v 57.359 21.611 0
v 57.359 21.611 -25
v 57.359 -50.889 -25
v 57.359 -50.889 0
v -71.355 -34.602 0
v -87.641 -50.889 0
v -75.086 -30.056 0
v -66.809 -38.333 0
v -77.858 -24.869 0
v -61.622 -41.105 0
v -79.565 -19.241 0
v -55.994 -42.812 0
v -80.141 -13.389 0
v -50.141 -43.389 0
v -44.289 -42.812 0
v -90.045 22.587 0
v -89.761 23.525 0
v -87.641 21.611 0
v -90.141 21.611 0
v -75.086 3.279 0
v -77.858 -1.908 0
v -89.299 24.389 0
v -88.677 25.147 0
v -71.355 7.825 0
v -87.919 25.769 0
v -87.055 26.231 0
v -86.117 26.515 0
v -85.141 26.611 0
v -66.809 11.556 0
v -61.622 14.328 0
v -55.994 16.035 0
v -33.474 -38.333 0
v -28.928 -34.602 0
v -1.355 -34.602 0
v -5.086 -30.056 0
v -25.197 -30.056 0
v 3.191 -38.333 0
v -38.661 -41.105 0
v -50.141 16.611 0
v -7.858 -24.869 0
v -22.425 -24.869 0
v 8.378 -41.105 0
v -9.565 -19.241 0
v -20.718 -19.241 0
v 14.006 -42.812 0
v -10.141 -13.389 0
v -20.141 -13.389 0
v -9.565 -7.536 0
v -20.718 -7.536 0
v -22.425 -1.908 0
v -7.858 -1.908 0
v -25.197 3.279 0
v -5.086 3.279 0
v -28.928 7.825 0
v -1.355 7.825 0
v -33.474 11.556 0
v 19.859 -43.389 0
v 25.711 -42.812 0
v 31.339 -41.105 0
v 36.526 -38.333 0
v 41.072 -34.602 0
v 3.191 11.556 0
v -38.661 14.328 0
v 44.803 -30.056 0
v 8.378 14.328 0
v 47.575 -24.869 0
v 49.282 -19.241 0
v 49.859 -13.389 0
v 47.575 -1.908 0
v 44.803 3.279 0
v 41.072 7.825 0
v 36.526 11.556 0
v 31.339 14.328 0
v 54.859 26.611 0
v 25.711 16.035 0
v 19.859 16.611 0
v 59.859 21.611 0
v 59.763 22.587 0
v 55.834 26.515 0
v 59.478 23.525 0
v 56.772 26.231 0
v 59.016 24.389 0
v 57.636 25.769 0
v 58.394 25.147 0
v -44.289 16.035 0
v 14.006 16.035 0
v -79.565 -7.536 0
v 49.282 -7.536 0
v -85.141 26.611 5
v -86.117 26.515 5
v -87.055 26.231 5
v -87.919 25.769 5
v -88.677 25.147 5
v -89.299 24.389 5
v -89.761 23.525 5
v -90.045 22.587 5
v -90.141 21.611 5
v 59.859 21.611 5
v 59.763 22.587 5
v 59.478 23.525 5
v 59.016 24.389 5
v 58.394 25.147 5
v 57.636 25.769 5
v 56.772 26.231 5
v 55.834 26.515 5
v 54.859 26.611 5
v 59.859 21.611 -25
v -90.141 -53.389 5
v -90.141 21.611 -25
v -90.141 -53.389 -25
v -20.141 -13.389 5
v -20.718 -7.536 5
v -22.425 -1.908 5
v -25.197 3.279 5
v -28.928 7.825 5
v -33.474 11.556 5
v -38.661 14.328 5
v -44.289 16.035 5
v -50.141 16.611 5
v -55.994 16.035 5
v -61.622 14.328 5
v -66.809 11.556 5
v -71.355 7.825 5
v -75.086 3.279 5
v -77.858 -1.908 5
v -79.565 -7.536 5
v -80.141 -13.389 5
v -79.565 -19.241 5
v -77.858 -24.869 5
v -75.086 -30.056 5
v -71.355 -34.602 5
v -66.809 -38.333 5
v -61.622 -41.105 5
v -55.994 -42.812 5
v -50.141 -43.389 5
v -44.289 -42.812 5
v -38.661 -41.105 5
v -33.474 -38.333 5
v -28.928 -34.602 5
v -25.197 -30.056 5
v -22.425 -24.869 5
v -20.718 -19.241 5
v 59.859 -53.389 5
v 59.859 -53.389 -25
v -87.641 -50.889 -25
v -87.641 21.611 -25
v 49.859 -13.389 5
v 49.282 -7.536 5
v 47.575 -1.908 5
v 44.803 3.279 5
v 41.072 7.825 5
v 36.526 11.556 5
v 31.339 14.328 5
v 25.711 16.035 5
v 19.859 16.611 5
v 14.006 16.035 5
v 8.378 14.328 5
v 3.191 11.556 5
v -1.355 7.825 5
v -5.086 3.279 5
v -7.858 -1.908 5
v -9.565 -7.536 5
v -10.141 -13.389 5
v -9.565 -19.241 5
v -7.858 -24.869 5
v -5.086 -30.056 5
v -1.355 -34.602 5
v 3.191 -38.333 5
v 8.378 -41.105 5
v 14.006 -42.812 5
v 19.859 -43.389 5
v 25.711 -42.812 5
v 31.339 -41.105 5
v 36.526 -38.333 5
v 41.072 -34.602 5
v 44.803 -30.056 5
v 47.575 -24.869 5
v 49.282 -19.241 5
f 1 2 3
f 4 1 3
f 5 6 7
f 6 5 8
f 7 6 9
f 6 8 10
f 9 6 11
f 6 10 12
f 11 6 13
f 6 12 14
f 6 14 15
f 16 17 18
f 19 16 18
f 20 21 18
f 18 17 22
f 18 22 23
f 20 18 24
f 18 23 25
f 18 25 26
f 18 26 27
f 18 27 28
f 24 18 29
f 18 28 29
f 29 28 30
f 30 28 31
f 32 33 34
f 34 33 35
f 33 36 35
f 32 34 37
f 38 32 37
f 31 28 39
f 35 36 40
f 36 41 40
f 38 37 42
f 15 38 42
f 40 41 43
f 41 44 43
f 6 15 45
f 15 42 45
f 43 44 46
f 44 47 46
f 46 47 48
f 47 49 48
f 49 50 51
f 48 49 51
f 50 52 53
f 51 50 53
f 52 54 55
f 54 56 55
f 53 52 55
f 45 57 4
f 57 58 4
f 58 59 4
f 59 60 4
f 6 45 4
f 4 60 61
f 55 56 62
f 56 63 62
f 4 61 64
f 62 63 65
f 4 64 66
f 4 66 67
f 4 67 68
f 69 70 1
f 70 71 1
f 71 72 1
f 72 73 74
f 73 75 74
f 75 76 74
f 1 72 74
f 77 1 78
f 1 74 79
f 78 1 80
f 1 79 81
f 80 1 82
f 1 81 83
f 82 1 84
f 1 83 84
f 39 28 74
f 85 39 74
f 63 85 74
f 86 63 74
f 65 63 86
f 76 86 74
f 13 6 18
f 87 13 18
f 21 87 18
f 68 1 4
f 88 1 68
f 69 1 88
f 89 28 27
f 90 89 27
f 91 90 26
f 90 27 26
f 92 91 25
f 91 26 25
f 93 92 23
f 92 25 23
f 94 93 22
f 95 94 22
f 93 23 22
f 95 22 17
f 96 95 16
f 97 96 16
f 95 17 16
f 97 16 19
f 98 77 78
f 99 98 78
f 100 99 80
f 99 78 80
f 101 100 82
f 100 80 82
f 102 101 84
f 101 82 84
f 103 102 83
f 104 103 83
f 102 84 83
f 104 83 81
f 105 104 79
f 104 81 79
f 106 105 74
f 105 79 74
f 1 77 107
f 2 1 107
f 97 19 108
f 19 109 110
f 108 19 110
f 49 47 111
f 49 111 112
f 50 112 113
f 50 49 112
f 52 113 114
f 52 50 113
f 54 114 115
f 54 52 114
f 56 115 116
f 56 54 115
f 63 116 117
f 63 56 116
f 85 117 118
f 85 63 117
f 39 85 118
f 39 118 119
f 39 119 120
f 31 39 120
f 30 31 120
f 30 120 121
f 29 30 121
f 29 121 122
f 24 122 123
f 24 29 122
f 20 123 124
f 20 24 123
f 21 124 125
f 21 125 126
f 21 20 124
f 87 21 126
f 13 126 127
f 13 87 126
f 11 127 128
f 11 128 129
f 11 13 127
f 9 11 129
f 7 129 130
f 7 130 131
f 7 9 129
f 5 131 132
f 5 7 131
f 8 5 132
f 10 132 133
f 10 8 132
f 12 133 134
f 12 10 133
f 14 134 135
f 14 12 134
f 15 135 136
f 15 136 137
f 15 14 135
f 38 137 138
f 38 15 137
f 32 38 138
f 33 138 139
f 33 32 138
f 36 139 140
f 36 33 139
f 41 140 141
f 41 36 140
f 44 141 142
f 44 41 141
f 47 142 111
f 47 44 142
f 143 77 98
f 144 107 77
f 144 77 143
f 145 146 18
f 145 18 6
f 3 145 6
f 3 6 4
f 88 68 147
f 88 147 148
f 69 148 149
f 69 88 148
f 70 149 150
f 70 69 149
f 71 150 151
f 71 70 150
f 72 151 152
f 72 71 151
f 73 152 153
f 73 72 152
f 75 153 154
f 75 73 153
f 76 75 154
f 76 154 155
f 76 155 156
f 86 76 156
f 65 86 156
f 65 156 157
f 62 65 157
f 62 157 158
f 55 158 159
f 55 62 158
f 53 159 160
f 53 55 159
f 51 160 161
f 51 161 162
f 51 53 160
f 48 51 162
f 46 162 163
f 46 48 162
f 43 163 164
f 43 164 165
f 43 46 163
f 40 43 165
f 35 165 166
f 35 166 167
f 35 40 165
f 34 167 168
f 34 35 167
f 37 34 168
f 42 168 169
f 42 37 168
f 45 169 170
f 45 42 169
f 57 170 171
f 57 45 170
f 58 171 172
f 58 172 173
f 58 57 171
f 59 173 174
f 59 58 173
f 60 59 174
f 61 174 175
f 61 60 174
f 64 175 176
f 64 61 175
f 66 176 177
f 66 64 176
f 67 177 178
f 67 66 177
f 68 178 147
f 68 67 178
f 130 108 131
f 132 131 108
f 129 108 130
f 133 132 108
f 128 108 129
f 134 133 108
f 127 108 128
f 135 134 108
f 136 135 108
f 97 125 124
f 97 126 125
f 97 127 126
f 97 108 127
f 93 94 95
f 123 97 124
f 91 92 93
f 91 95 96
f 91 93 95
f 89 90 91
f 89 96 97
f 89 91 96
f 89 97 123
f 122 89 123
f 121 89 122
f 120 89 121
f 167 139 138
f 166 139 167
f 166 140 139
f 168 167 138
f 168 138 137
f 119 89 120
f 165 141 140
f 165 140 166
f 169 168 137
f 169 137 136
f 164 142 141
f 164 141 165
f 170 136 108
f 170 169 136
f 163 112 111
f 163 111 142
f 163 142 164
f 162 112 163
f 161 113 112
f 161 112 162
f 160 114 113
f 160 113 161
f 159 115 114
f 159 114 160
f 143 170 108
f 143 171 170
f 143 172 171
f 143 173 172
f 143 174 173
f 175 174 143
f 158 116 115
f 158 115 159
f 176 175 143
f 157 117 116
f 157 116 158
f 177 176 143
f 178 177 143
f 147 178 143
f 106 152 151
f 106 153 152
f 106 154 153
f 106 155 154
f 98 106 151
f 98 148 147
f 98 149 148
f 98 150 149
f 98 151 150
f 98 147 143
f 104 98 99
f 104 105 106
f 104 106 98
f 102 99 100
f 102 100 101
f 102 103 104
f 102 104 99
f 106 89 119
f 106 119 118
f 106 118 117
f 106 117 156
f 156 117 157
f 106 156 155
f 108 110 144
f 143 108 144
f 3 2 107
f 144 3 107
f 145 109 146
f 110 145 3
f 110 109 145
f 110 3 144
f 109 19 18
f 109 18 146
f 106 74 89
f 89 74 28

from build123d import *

# Parameters (mm, degrees)
F0_R          = 30
F2_DEPTH      = 5
F1_E0_TOP_W   = 150
F1_E0_TOP_H   = 25
F3_DEPTH      = 2.5
F5_E0_RIGHT_W = 75
F5_E0_RIGHT_H = 25
F6_DEPTH      = 2.5
F4_E0_LEFT_W  = 75
F4_E0_LEFT_H  = 25
F7_DEPTH      = 2.5


with BuildPart() as f2:
    # F0 (on Top) → F2 (new body)
    with BuildSketch(Plane.XY):
        with BuildLine():
            Line((54.8585835038, 26.6114953801), (-85.1414164962, 26.6114953801))
            ThreePointArc((-85.1414164962, 26.6114953801), (-88.6769504021, 25.1470292861), (-90.1414164962, 21.6114953801))
            Line((-90.1414164962, 21.6114953801), (-90.1414164962, -53.3885046199))
            Line((-90.1414164962, -53.3885046199), (59.8585835038, -53.3885046199))
            Line((59.8585835038, -53.3885046199), (59.8585835038, 21.6114953801))
            ThreePointArc((59.8585835038, 21.6114953801), (58.3941174097, 25.1470292861), (54.8585835038, 26.6114953801))
        make_face()
        with Locations((-50.1414164962, -13.3885046199)):
            Circle(F0_R, mode=Mode.SUBTRACT)
        with Locations((19.8585835038, -13.3885046199)):
            Circle(F0_R, mode=Mode.SUBTRACT)
    extrude(amount=F2_DEPTH)

    # F1_E0_top (on explicit) → F3 (join)
    with BuildSketch(Plane(origin=(-90.1414164962, -53.3885046199, 0), x_dir=(1, 0, 0), z_dir=(0, 1, 0))):
        with Locations((75, 12.5)):
            Rectangle(F1_E0_TOP_W, F1_E0_TOP_H)
    extrude(amount=F3_DEPTH)

    # F5_E0_right (on explicit) → F6 (join)
    with BuildSketch(Plane(origin=(59.8585835038, 21.6114953801, 0), x_dir=(0, -1, 0), z_dir=(1, 0, 0))):
        with Locations((37.5, 12.5)):
            Rectangle(F5_E0_RIGHT_W, F5_E0_RIGHT_H)
    extrude(amount=-F6_DEPTH)

    # F4_E0_left (on explicit) → F7 (join)
    with BuildSketch(Plane(origin=(-90.1414164962, 21.6114953801, 0), x_dir=(0, -1, 0), z_dir=(1, 0, 0))):
        with Locations((37.5, 12.5)):
            Rectangle(F4_E0_LEFT_W, F4_E0_LEFT_H)
    extrude(amount=F7_DEPTH)


solid = f2.part
